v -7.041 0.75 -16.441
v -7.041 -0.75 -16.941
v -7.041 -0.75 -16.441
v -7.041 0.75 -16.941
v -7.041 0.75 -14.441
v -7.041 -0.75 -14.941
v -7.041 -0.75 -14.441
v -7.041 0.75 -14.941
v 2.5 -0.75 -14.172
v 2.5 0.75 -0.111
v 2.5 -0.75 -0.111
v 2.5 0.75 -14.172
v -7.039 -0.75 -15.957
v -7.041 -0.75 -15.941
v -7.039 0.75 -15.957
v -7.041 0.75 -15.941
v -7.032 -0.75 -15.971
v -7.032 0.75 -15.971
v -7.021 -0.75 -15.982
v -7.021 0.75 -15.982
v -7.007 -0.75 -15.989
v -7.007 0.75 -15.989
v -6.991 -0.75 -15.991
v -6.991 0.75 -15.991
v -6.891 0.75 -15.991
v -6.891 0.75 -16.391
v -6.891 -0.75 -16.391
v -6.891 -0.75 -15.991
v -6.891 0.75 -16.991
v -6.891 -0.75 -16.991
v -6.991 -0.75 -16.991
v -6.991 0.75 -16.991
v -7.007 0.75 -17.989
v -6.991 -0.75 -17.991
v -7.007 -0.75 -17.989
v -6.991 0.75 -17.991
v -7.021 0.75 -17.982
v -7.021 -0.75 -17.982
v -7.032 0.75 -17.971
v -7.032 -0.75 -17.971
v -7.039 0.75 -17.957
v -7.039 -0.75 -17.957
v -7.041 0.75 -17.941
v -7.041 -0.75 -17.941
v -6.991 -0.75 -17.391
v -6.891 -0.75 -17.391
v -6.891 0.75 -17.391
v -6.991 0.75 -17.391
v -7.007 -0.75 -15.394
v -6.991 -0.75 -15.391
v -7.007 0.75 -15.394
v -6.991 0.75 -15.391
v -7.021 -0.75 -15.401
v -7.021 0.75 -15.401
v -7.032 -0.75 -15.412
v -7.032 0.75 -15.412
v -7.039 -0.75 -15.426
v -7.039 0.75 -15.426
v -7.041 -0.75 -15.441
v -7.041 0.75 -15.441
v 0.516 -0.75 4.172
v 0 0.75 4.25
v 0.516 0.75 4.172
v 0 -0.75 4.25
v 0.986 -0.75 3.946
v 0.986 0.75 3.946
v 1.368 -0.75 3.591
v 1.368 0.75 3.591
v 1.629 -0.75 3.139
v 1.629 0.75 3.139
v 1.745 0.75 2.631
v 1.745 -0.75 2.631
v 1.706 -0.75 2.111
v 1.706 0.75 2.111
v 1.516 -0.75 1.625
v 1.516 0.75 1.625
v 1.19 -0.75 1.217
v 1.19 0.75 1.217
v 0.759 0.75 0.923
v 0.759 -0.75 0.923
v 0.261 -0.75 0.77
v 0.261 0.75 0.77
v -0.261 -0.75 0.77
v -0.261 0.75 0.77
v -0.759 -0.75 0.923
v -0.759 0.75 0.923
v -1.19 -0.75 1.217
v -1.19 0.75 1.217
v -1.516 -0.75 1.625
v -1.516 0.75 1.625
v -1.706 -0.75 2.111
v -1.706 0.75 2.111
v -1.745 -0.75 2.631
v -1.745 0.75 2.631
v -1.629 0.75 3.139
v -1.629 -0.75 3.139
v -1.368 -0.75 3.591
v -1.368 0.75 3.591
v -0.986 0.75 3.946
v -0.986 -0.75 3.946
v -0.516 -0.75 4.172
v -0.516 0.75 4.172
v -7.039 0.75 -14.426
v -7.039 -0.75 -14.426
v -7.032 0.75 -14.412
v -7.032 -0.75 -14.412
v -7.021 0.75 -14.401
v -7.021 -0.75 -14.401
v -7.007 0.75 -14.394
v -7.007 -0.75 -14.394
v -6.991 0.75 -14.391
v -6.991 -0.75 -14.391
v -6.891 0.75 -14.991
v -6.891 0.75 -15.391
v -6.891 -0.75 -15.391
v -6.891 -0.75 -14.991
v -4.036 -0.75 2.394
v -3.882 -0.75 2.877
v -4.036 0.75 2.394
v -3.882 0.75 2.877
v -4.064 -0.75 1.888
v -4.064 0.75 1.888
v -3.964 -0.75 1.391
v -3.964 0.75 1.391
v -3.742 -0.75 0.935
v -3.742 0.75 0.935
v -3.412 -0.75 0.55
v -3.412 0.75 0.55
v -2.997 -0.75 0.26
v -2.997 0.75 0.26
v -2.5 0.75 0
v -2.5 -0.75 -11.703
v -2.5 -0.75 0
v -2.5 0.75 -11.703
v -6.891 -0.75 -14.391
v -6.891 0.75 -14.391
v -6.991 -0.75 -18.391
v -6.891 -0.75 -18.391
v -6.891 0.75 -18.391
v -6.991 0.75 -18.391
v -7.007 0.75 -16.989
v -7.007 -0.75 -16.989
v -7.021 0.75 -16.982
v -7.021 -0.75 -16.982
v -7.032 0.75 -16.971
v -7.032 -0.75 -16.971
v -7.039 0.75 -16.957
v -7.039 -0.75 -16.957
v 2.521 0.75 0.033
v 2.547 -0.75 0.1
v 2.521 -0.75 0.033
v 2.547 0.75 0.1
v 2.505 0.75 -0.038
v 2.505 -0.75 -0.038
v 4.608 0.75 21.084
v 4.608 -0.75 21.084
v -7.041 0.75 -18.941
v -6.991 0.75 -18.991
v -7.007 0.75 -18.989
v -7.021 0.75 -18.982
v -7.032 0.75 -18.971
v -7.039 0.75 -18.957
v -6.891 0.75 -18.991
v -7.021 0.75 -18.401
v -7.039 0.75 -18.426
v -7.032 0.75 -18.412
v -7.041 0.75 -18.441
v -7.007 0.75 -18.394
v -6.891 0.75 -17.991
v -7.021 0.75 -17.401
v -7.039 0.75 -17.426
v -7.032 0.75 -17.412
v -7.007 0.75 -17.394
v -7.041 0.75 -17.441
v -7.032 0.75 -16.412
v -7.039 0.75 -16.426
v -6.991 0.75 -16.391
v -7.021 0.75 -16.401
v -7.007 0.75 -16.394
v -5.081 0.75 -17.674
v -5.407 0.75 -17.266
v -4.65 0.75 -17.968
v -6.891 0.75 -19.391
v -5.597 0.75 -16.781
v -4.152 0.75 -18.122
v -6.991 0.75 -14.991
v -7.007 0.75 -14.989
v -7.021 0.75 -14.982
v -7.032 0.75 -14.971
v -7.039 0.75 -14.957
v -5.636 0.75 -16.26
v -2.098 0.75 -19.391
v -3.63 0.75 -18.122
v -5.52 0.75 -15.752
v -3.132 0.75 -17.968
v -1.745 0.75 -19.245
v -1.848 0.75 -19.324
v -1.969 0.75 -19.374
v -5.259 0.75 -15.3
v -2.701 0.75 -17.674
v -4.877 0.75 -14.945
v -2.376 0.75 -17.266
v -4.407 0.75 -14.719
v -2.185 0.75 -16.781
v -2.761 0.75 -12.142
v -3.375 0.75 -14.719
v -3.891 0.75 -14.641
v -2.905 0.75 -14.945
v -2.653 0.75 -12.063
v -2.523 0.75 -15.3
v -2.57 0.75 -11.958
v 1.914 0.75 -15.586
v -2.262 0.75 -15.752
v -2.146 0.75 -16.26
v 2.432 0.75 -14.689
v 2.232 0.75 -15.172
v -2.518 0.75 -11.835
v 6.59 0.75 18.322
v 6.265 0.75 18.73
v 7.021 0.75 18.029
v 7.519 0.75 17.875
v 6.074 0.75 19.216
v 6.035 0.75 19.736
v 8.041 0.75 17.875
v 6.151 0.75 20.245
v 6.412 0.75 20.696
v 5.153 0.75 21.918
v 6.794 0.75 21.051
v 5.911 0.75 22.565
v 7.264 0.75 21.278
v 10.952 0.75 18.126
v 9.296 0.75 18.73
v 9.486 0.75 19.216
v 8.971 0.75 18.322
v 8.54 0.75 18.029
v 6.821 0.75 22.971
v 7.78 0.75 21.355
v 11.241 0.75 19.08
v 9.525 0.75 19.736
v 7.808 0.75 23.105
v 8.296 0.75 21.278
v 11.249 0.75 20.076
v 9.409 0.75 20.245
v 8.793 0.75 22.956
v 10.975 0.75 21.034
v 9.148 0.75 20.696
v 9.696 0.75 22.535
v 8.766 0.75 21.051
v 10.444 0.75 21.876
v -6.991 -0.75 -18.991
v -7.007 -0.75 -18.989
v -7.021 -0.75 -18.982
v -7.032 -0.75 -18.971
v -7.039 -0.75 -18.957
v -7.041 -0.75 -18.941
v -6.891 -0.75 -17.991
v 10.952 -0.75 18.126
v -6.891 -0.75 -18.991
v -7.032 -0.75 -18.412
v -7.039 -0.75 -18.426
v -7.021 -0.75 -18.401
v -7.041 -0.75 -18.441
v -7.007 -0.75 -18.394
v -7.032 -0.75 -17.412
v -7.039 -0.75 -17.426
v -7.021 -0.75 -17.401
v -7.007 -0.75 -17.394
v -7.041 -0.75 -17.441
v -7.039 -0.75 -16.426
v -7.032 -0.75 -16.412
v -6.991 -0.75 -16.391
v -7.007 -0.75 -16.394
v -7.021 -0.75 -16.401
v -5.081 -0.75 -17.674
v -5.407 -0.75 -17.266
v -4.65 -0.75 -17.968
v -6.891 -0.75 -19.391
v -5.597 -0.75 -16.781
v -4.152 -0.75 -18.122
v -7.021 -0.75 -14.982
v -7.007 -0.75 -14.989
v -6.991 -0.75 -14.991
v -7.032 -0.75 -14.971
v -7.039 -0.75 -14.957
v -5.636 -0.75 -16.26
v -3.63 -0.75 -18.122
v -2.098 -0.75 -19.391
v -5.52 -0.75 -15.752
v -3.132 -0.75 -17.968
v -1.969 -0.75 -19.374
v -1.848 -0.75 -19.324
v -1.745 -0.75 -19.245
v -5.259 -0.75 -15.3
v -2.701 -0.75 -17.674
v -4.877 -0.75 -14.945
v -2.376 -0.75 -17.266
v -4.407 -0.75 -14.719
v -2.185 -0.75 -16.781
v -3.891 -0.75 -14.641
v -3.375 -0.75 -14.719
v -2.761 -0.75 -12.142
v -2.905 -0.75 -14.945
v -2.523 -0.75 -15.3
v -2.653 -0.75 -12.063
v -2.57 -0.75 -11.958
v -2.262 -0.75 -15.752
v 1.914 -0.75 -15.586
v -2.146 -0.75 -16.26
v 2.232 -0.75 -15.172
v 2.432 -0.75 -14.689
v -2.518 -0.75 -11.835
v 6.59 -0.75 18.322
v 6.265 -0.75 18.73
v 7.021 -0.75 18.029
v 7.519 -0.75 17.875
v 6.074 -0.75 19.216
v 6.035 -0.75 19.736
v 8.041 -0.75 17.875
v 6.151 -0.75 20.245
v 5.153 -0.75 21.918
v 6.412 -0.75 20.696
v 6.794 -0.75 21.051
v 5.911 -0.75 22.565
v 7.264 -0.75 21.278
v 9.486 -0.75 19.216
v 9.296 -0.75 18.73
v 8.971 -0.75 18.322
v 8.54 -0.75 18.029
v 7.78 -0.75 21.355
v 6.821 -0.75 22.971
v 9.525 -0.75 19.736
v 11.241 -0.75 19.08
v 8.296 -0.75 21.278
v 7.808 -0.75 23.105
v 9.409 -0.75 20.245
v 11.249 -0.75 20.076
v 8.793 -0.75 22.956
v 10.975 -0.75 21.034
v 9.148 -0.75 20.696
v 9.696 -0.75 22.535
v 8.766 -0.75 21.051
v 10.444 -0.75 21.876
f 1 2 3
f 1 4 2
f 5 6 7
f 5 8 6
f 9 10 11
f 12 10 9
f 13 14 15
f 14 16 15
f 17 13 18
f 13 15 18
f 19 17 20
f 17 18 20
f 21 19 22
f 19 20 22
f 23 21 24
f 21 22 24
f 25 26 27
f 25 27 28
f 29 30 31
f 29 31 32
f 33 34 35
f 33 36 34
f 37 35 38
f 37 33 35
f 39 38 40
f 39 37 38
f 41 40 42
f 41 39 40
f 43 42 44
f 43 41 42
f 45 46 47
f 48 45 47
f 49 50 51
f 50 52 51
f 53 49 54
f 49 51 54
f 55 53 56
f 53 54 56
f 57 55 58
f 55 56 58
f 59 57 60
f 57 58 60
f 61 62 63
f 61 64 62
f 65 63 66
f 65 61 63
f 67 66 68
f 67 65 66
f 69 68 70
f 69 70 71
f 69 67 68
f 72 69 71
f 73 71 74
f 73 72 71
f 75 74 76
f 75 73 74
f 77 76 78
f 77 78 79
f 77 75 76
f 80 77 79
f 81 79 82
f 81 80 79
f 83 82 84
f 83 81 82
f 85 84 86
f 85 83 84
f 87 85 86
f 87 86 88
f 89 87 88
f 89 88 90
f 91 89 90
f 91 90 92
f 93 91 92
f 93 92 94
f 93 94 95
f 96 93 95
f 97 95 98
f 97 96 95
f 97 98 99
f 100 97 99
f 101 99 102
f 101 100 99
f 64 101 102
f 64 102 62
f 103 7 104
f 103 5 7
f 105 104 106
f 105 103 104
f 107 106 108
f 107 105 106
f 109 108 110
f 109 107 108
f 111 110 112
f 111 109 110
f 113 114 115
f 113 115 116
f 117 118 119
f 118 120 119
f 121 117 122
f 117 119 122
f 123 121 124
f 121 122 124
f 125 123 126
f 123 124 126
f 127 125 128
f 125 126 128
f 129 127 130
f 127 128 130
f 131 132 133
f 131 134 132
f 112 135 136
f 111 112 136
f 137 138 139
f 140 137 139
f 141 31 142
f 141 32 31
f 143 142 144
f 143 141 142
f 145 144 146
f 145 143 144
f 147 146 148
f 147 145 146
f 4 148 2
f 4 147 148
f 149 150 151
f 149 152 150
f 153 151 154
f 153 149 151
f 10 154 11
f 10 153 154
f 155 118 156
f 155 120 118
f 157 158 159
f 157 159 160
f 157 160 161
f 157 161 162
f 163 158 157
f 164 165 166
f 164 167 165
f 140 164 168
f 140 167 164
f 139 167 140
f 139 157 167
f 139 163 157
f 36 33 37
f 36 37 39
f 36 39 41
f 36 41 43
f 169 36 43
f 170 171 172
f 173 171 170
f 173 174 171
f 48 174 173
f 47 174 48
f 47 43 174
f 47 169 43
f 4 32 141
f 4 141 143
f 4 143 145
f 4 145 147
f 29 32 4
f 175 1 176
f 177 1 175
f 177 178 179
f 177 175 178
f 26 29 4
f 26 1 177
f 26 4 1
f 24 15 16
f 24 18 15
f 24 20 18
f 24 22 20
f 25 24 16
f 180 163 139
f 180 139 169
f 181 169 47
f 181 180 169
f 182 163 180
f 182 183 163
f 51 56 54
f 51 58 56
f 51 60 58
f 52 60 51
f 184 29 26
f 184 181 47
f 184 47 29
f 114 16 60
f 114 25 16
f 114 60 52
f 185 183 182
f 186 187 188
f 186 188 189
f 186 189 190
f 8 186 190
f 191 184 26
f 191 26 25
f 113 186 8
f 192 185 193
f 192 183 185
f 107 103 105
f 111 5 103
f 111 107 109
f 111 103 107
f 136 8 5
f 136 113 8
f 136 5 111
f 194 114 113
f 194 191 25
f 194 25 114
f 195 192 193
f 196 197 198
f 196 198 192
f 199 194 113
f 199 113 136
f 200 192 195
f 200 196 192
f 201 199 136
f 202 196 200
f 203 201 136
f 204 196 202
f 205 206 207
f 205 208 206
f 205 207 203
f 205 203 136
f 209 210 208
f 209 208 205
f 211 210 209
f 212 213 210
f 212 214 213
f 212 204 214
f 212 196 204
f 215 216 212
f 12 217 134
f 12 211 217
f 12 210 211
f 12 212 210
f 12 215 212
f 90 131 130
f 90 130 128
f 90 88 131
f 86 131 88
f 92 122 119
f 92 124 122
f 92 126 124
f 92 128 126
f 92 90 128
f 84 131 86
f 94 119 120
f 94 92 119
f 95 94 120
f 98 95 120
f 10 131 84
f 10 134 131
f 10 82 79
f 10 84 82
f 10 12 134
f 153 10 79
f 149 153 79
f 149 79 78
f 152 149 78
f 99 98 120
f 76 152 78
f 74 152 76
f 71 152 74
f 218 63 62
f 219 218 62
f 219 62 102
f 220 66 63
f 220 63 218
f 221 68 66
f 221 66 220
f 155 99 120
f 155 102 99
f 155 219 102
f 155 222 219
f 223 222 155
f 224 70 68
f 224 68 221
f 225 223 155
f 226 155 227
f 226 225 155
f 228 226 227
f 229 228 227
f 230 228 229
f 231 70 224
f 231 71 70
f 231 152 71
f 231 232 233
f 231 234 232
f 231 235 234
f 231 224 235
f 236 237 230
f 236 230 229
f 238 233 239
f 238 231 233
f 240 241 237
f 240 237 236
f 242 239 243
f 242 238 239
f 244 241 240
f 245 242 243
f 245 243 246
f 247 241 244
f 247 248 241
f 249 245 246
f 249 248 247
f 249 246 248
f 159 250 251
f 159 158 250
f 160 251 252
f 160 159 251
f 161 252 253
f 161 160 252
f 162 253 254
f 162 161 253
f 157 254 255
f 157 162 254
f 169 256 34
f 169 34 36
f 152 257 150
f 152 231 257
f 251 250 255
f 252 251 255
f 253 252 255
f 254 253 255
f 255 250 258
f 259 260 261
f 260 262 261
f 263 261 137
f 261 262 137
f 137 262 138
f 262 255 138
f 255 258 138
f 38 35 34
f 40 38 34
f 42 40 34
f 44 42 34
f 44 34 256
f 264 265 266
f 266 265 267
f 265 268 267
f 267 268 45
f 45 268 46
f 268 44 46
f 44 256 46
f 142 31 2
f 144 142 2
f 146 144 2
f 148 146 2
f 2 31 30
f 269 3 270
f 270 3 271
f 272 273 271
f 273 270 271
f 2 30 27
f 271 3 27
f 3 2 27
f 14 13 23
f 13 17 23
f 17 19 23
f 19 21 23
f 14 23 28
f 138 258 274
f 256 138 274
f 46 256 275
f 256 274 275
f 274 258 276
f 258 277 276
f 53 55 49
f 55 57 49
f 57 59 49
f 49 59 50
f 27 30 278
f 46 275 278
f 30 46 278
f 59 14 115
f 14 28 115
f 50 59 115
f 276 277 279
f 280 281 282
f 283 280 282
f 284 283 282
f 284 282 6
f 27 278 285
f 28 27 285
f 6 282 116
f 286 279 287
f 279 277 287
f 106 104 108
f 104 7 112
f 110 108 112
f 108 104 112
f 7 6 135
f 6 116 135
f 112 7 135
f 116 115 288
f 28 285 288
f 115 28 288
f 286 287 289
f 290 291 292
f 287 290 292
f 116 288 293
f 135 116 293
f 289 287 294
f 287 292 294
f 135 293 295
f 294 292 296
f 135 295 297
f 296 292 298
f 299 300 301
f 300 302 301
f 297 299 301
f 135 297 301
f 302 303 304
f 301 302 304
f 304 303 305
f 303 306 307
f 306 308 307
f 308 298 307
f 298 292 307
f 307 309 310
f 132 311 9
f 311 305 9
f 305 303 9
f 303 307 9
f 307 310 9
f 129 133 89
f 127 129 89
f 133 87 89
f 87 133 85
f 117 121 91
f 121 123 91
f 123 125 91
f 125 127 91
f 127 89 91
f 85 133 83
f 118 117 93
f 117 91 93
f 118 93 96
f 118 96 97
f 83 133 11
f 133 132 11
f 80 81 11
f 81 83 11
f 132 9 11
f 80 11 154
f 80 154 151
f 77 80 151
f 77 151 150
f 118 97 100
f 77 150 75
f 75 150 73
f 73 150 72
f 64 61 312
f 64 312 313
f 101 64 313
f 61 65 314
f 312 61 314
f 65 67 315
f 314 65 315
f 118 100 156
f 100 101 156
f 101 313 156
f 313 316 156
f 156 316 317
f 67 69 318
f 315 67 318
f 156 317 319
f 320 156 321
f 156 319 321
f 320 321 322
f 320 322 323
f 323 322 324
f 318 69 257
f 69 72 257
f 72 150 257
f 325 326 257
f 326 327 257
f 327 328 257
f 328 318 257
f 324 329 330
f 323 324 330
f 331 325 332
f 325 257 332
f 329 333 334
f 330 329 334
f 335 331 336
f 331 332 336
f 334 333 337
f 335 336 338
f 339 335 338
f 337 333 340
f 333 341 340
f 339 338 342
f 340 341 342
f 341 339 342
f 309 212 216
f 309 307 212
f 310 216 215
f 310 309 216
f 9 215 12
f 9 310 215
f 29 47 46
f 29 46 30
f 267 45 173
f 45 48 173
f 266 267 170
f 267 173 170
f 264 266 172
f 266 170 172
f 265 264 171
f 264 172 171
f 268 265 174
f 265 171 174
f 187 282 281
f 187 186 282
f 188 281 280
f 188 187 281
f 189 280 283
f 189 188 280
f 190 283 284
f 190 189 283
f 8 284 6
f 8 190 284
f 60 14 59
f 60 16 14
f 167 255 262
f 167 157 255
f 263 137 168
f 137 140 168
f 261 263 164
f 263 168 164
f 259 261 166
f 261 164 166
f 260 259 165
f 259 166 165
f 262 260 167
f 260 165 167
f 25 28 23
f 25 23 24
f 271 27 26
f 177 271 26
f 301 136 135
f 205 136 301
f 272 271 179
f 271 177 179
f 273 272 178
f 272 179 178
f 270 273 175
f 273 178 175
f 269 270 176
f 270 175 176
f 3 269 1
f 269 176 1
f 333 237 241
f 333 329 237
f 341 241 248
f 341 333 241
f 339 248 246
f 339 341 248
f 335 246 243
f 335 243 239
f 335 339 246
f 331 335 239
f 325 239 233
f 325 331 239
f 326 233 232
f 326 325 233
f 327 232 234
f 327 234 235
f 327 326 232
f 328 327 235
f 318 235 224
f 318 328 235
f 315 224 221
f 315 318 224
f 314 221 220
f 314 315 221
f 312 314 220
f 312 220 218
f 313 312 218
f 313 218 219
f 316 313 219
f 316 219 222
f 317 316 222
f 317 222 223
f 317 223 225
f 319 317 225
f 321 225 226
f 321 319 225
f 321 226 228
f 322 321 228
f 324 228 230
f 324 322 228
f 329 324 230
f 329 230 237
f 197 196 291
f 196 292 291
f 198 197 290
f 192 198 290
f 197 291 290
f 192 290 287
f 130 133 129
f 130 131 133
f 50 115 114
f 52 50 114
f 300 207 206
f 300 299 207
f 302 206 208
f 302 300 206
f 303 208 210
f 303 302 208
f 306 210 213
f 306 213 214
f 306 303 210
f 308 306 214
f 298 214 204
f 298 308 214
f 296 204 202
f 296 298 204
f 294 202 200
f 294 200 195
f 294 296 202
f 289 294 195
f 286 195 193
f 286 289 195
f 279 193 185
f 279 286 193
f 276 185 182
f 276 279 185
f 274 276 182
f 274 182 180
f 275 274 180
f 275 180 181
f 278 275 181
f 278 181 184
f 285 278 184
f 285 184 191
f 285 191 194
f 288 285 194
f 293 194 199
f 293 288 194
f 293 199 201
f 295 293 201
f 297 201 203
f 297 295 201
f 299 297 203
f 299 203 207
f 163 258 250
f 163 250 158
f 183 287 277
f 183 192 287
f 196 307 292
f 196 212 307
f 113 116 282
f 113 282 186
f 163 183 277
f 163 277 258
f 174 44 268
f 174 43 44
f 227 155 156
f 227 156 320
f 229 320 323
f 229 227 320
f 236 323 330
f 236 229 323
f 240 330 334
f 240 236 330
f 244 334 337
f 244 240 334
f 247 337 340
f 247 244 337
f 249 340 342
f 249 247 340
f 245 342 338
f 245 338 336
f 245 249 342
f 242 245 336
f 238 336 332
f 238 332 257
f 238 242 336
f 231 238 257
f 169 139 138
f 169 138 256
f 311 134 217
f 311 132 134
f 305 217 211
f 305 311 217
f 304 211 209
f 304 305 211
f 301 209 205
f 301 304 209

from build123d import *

# Parameters (mm, degrees)
SKETCH1_R           = 1.75
BOSS_EXTRUDE1_DEPTH = 0.75
FILLET1_R           = 2
FILLET2_R           = 0.5
SKETCH2_W           = 0.6
SKETCH2_H           = 1.5
BOSS_EXTRUDE2_DEPTH = 0.15
FILLET3_R           = 0.05


with BuildPart() as part:
    # Sketch1 → Boss-Extrude1 (new, symmetric)
    with BuildSketch(Plane(origin=(0, 0, 0), x_dir=(1, 0, 0), z_dir=(0, 1, 0))):
        with BuildLine():
            Line((-2.5, 12), (-2.5, 0))
            Line((-2.5, 0), (-4.689391033, -1.145712258))
            Line((-4.689391033, -1.145712258), (4.608210726, -21.084483573))
            ThreePointArc((4.608210726, -21.084483573), (9.259451896, -22.777396911), (10.952365235, -18.126155741))
            Line((10.952365235, -18.126155741), (2.5, 0))
            Line((2.5, 0), (2.5, 15))
            Line((2.5, 15), (-1.891164992, 19.391164992))
            Line((-1.891164992, 19.391164992), (-6.891164992, 19.391164992))
            Line((-6.891164992, 19.391164992), (-6.891164992, 14.391164992))
            Line((-6.891164992, 14.391164992), (-2.5, 12))
        make_face()
        with Locations(Location((-3.891164992, 16.391164992, 0), (0, 0, 270))):
            Circle(SKETCH1_R, mode=Mode.SUBTRACT)
        with Locations(Location((0, -2.5, 0), (0, 0, 270))):
            Circle(SKETCH1_R, mode=Mode.SUBTRACT)
        with Locations(Location((7.78028798, -19.605319657, 0), (0, 0, 270))):
            Circle(SKETCH1_R, mode=Mode.SUBTRACT)
    extrude(amount=BOSS_EXTRUDE1_DEPTH, both=True)

    # Fillet1
    fillet1_edges = [part.edges().sort_by_distance(p)[0] for p in [
        (2.5, 0, -15),
        (-4.689391033, 0, 1.145712258),
    ]]
    fillet(fillet1_edges, radius=FILLET1_R)

    # Fillet2
    fillet2_edges = [part.edges().sort_by_distance(p)[0] for p in [
        (-1.891164992, 0, -19.391164992),
        (2.5, 0, 0),
        (-2.5, 0, -12),
    ]]
    fillet(fillet2_edges, radius=FILLET2_R)

    # Sketch2 → Boss-Extrude2 (add)
    with BuildSketch(Plane.ZY.offset(6.891164992)):
        with Locations((-14.691164992, 0)):
            Rectangle(SKETCH2_W, SKETCH2_H)
        with Locations((-15.691164992, 0)):
            Rectangle(SKETCH2_W, SKETCH2_H)
        with Locations((-16.691164992, 0)):
            Rectangle(SKETCH2_W, SKETCH2_H)
        with Locations((-17.691164992, 0)):
            Rectangle(SKETCH2_W, SKETCH2_H)
        with Locations((-18.691164992, 0)):
            Rectangle(SKETCH2_W, SKETCH2_H)
    extrude(amount=BOSS_EXTRUDE2_DEPTH)

    # Fillet3
    fillet3_edges = [part.edges().sort_by_distance(p)[0] for p in [
        (-7.041164992, 0, -16.991164992),
        (-7.041164992, 0, -16.391164992),
        (-7.041164992, 0, -17.991164992),
        (-7.041164992, 0, -17.391164992),
        (-7.041164992, 0, -18.991164992),
        (-7.041164992, 0, -18.391164992),
        (-7.041164992, 0, -14.991164992),
        (-7.041164992, 0, -14.391164992),
        (-7.041164992, 0, -15.991164992),
        (-7.041164992, 0, -15.391164992),
    ]]
    fillet(fillet3_edges, radius=FILLET3_R)


solid = part.part
